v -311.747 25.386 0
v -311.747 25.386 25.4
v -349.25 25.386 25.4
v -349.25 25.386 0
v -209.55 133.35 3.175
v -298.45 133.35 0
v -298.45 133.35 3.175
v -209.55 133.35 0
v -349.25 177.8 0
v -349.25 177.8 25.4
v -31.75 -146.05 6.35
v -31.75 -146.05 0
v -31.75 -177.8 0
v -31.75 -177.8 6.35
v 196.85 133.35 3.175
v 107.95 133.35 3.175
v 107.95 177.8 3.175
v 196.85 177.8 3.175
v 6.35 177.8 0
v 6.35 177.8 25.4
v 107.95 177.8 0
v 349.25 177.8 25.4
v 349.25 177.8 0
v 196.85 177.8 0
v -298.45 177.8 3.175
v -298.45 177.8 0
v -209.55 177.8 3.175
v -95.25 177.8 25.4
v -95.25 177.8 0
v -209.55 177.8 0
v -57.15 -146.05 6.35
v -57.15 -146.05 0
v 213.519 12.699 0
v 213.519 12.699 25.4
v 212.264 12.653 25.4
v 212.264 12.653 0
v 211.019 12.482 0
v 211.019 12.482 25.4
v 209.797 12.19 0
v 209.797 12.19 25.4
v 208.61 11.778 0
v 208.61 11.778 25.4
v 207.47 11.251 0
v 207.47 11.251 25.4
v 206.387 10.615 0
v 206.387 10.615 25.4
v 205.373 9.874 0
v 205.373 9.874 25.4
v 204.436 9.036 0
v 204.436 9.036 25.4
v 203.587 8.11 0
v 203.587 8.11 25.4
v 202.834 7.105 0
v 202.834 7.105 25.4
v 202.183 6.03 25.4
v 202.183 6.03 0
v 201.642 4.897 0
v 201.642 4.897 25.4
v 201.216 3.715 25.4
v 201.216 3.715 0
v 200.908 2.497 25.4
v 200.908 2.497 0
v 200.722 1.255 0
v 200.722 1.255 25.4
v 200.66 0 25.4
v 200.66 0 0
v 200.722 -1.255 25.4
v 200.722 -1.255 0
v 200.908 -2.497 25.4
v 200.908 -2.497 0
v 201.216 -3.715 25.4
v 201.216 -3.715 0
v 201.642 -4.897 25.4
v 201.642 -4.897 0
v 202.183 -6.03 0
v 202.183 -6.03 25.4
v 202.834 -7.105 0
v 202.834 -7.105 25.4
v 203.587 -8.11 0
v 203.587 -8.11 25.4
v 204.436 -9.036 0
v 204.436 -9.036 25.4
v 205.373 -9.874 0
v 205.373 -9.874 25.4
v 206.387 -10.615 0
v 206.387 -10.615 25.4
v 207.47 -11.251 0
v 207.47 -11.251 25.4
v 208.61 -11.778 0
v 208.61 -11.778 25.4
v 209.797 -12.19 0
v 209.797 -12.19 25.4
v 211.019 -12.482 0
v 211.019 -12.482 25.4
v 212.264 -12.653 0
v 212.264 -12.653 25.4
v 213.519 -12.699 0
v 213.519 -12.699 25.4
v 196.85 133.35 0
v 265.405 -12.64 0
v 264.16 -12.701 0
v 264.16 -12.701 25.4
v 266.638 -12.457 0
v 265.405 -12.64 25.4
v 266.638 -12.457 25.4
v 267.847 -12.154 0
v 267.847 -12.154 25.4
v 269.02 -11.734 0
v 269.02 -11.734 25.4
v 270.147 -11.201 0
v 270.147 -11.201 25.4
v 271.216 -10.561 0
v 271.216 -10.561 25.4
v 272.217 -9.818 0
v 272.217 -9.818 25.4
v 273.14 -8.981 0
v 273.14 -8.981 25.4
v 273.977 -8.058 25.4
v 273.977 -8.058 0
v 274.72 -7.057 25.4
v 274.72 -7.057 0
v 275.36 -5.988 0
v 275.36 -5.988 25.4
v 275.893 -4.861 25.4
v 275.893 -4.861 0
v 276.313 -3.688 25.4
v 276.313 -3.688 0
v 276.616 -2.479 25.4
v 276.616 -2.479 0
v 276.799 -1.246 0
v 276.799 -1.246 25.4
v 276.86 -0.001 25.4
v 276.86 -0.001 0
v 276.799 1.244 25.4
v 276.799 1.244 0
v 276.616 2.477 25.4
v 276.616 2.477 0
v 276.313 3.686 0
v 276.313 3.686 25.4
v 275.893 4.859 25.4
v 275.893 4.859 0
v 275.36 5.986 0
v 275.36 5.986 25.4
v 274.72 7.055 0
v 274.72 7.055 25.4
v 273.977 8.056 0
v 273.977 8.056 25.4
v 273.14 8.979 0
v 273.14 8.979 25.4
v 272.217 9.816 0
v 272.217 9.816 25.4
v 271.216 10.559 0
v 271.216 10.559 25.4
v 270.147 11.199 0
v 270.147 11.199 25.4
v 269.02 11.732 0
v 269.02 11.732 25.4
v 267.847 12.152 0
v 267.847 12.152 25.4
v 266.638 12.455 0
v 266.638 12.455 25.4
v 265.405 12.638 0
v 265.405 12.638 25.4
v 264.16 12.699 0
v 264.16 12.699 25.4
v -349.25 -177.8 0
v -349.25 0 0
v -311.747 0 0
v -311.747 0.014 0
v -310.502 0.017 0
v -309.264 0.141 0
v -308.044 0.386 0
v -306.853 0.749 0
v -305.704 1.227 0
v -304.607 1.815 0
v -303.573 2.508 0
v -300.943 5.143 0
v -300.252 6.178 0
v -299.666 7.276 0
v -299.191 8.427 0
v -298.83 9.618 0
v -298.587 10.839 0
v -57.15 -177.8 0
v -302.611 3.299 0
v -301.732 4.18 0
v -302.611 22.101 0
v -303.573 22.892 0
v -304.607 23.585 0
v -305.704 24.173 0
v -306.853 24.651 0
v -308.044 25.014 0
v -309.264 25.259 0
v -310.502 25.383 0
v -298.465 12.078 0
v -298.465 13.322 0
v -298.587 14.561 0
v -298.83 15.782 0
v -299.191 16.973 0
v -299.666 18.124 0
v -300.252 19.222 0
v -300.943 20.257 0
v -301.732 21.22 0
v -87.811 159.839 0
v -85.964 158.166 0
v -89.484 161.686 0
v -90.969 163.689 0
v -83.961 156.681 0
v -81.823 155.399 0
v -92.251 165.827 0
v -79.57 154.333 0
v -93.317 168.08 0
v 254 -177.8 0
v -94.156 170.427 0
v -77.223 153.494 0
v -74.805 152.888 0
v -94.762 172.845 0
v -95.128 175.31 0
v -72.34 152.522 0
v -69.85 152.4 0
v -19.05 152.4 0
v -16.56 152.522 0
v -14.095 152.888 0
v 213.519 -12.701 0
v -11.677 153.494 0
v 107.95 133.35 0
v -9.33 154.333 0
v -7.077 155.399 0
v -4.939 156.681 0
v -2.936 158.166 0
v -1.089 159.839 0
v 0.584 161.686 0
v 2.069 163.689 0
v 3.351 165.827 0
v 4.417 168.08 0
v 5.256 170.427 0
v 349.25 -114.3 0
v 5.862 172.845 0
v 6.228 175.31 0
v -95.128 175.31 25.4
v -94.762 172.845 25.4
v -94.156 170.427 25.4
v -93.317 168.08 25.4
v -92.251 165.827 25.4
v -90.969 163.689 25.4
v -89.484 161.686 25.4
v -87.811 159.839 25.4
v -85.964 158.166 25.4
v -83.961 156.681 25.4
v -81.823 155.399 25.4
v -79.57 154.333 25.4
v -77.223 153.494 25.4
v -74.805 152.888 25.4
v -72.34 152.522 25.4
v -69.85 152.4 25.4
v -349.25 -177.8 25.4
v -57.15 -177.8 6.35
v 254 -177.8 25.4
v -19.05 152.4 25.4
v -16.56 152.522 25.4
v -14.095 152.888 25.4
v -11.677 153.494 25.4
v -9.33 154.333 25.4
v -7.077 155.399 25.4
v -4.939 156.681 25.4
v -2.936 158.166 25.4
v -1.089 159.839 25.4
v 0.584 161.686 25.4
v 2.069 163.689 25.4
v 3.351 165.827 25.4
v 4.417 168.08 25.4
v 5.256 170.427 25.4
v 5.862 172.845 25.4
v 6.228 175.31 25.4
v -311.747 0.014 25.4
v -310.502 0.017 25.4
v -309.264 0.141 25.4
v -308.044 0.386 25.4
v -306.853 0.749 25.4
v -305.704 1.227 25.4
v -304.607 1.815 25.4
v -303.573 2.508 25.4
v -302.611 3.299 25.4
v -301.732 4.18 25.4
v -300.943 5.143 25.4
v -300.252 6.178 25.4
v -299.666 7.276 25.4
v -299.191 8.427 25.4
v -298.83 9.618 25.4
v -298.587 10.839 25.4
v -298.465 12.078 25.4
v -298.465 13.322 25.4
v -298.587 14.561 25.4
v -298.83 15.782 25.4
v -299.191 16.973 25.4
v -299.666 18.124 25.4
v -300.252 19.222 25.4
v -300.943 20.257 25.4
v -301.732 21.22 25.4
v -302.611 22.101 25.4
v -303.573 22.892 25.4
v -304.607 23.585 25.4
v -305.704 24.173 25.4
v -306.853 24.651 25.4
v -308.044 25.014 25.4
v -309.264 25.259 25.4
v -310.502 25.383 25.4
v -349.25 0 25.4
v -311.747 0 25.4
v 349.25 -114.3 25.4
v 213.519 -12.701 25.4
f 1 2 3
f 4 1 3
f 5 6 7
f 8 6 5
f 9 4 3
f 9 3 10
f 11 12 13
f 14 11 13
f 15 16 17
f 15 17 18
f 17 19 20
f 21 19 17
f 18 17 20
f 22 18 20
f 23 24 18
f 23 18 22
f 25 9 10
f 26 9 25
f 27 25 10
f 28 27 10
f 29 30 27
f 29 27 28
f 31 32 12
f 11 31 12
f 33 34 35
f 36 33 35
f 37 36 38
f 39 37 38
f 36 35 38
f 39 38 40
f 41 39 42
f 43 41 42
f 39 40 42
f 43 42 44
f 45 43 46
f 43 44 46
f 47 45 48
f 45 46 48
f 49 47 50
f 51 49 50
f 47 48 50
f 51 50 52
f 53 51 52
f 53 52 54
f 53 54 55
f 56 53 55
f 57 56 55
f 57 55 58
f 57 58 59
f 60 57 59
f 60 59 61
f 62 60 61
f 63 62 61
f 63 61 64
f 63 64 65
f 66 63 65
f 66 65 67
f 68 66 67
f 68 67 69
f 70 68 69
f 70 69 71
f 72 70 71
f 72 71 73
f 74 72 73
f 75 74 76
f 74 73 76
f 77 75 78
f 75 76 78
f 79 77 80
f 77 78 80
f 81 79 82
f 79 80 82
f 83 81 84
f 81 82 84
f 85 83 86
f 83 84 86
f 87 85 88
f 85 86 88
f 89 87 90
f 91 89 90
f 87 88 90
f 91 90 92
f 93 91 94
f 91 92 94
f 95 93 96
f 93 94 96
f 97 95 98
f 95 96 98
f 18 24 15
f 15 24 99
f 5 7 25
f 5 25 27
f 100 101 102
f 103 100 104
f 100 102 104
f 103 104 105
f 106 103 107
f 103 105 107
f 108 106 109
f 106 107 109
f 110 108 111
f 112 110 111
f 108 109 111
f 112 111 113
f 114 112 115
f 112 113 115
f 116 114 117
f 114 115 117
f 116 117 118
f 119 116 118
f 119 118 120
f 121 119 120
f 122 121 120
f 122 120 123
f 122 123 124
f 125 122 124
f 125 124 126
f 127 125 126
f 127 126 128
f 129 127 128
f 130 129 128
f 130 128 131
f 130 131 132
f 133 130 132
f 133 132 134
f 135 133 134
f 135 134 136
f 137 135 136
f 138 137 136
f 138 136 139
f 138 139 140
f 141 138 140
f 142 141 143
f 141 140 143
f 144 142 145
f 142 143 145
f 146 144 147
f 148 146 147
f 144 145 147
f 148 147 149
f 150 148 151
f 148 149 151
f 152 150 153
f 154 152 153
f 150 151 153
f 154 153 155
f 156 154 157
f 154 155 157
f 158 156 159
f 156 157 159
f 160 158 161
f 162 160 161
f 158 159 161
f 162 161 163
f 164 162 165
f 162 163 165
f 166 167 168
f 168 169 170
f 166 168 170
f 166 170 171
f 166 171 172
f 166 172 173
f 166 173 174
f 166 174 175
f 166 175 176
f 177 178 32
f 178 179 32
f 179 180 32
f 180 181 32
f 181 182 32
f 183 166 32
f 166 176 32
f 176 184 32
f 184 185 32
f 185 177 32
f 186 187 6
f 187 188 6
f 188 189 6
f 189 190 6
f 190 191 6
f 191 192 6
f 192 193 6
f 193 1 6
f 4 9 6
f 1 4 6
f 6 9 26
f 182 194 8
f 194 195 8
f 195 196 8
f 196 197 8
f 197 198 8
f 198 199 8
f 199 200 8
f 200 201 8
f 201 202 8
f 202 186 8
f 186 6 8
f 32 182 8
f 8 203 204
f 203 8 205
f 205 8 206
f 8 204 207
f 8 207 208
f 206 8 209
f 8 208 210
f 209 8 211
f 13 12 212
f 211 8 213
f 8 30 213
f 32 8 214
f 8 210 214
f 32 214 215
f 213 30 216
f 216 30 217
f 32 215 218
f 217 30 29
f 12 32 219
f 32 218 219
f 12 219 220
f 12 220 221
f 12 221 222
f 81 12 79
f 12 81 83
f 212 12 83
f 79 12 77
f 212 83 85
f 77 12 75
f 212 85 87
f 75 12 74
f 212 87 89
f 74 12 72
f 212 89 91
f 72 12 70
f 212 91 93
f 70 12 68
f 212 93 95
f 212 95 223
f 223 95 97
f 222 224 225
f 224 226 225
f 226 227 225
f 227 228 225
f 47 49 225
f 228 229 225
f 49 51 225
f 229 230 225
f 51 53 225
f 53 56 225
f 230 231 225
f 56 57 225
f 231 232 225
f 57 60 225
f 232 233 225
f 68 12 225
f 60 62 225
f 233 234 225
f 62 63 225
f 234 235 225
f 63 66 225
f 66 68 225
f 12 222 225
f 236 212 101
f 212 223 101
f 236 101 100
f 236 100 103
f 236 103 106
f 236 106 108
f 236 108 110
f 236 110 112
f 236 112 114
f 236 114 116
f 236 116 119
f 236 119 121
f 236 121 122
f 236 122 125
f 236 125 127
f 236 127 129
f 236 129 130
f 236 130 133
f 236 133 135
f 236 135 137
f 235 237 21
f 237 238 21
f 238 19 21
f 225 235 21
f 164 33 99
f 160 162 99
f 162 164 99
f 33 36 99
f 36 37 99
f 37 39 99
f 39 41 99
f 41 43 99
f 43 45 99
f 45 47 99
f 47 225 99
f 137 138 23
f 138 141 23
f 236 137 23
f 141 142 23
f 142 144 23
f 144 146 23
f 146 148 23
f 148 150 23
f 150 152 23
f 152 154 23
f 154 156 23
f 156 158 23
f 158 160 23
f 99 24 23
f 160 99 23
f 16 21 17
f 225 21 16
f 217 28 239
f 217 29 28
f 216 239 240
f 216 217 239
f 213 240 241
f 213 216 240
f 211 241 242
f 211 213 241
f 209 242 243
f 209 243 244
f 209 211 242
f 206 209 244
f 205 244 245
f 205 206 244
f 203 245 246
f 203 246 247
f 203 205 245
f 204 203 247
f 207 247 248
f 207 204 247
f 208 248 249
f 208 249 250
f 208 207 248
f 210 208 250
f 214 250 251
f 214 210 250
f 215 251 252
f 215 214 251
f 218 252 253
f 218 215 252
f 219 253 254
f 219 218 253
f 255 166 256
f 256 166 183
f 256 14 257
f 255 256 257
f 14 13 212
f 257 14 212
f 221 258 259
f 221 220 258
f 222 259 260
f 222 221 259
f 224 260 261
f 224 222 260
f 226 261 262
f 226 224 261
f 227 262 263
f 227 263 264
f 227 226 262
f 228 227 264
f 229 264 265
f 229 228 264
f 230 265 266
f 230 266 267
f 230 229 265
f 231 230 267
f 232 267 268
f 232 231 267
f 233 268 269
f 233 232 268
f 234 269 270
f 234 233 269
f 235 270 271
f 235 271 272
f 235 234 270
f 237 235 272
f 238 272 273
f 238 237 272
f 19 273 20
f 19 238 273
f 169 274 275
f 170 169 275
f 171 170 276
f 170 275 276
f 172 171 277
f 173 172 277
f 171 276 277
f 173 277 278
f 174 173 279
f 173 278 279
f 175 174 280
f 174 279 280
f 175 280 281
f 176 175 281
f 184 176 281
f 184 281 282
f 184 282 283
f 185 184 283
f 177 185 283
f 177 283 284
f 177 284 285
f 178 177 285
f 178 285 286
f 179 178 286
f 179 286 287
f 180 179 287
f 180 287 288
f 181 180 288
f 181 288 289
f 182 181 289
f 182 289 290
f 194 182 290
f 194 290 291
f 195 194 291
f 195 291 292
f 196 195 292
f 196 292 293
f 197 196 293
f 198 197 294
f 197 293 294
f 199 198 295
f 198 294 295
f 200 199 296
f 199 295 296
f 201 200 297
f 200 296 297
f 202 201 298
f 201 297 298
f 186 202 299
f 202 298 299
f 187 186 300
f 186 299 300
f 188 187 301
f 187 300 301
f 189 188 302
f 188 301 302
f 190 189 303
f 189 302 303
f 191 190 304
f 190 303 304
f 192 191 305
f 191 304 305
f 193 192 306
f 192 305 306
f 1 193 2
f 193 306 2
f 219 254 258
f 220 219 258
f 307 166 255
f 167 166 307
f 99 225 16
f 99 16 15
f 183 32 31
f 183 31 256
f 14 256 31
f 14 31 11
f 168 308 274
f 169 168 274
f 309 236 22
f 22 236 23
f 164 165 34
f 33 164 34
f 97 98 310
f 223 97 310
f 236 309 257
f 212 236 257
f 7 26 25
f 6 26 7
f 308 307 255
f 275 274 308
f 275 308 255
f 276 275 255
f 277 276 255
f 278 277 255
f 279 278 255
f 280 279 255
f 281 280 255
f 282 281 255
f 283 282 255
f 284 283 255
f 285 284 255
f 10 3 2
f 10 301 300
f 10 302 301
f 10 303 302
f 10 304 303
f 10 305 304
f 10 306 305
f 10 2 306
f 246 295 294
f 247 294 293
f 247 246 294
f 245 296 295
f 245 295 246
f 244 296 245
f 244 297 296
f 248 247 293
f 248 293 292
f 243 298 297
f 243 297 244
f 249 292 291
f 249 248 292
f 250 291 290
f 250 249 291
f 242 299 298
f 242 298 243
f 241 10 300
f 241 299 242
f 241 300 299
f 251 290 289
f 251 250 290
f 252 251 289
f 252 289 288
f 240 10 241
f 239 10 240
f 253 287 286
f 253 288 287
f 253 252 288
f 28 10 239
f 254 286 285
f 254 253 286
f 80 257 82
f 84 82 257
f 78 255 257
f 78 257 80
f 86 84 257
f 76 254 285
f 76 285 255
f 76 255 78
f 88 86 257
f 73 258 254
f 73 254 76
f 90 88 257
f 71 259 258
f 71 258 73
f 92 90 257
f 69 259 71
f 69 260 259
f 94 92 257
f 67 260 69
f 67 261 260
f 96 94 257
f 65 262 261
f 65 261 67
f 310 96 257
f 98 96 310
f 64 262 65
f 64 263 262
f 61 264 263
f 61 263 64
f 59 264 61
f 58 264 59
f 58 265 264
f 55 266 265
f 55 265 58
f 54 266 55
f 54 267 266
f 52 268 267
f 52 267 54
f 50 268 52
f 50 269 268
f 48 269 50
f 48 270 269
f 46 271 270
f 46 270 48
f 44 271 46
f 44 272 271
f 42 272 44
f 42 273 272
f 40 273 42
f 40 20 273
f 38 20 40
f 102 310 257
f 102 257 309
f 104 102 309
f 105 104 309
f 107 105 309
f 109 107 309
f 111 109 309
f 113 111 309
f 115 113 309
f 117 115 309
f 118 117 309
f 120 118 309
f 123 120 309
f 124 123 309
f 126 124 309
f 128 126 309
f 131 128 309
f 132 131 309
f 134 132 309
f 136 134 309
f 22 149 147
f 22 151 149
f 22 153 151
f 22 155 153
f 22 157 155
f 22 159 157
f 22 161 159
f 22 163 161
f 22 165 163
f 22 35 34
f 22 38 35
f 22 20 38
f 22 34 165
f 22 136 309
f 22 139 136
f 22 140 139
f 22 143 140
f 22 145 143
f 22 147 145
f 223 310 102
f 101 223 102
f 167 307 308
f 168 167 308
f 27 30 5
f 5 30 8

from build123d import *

# Parameters (mm, degrees)
F0_W      = 698.5
F0_H      = 355.6
F1_DEPTH  = 25.4
F3_DEPTH  = 25.401
F4_W      = 88.9
F4_H      = 44.45
F5_DEPTH  = 3.175
F7_DEPTH  = 25.401
F8_W      = 101.6
F8_H      = 25.4
F9_DEPTH  = 25.4
F10_R     = 25.39999
F11_W     = 25.4
F11_H     = 31.75
F12_DEPTH = 6.35


# Not quite as in the source:
# - a fillet or chamfer is up to 0.001 mm smaller than in the source, because OpenCascade refuses the exact size
# - a feature names something its author has since deleted; it is built from what else it names


with BuildPart() as f1:
    # F0 (on Top) → F1 (new body)
    with BuildSketch(Plane.XY):
        Rectangle(F0_W, F0_H)
    extrude(amount=F1_DEPTH)

    # F2 (on face) → F3 (cut, through all)
    with BuildSketch(Plane.XY.offset(25.4)):
        Polygon((349.25, -114.3), (254, -177.8), (349.25, -177.8), align=None)
    extrude(amount=-F3_DEPTH, mode=Mode.SUBTRACT)

    # F4 (on face) → F5 (cut)
    with BuildSketch(Plane(origin=(0, 0, 0), x_dir=(1, 0, 0), z_dir=(0, 0, -1))):
        with Locations((-254, -155.575)):
            Rectangle(F4_W, F4_H)
        with Locations((152.4, -155.575)):
            Rectangle(F4_W, F4_H)
    extrude(amount=-F5_DEPTH, mode=Mode.SUBTRACT)

    # F6 (on face) → F7 (cut, through all)
    with BuildSketch(Plane.XY.offset(25.4)):
        with BuildLine():
            Line((-311.747228622, 0), (-311.747228622, 0.0140503716))
            ThreePointArc((-311.747228622, 0.0140503716), (-298.45, 12.7), (-311.747228622, 25.3859496284))
            Line((-311.747228622, 25.3859496284), (-382.2402954102, 25.3859496284))
            Line((-382.2402954102, 25.3859496284), (-382.2402954102, 0))
            Line((-382.2402954102, 0), (-311.747228622, 0))
        make_face()
        with BuildLine():
            Line((264.16, 12.6990057829), (213.5189091712, 12.6990057829))
            ThreePointArc((213.5189091712, 12.6990057829), (200.66, 0), (213.5189091712, -12.6990057829))
            Line((213.5189091712, -12.6990057829), (213.5189091712, -12.7009942171))
            Line((213.5189091712, -12.7009942171), (264.16, -12.7009942171))
            ThreePointArc((264.16, -12.7009942171), (276.86, -0.0009942171), (264.16, 12.6990057829))
        make_face()
    extrude(amount=-F7_DEPTH, mode=Mode.SUBTRACT)

    # F8 (on face) → F9 (cut)
    with BuildSketch(Plane.XY.offset(25.4)):
        with Locations((-44.45, 165.1)):
            Rectangle(F8_W, F8_H)
    extrude(amount=-F9_DEPTH, mode=Mode.SUBTRACT)

    # F10 (radius 25.4 in the source; OpenCascade refuses exactly that, so slightly less here)
    f10_edges = [f1.edges().sort_by_distance(p)[0] for p in [
        (-95.25, 152.4, 12.7),
        (6.35, 152.4, 12.7),
    ]]
    fillet(f10_edges, radius=F10_R)

    # F11 (on face) → F12 (cut)
    with BuildSketch(Plane(origin=(0, 0, 0), x_dir=(1, 0, 0), z_dir=(0, 0, -1))):
        with Locations((-44.45, 161.925)):
            Rectangle(F11_W, F11_H)
    extrude(amount=-F12_DEPTH, mode=Mode.SUBTRACT)


solid = f1.part
